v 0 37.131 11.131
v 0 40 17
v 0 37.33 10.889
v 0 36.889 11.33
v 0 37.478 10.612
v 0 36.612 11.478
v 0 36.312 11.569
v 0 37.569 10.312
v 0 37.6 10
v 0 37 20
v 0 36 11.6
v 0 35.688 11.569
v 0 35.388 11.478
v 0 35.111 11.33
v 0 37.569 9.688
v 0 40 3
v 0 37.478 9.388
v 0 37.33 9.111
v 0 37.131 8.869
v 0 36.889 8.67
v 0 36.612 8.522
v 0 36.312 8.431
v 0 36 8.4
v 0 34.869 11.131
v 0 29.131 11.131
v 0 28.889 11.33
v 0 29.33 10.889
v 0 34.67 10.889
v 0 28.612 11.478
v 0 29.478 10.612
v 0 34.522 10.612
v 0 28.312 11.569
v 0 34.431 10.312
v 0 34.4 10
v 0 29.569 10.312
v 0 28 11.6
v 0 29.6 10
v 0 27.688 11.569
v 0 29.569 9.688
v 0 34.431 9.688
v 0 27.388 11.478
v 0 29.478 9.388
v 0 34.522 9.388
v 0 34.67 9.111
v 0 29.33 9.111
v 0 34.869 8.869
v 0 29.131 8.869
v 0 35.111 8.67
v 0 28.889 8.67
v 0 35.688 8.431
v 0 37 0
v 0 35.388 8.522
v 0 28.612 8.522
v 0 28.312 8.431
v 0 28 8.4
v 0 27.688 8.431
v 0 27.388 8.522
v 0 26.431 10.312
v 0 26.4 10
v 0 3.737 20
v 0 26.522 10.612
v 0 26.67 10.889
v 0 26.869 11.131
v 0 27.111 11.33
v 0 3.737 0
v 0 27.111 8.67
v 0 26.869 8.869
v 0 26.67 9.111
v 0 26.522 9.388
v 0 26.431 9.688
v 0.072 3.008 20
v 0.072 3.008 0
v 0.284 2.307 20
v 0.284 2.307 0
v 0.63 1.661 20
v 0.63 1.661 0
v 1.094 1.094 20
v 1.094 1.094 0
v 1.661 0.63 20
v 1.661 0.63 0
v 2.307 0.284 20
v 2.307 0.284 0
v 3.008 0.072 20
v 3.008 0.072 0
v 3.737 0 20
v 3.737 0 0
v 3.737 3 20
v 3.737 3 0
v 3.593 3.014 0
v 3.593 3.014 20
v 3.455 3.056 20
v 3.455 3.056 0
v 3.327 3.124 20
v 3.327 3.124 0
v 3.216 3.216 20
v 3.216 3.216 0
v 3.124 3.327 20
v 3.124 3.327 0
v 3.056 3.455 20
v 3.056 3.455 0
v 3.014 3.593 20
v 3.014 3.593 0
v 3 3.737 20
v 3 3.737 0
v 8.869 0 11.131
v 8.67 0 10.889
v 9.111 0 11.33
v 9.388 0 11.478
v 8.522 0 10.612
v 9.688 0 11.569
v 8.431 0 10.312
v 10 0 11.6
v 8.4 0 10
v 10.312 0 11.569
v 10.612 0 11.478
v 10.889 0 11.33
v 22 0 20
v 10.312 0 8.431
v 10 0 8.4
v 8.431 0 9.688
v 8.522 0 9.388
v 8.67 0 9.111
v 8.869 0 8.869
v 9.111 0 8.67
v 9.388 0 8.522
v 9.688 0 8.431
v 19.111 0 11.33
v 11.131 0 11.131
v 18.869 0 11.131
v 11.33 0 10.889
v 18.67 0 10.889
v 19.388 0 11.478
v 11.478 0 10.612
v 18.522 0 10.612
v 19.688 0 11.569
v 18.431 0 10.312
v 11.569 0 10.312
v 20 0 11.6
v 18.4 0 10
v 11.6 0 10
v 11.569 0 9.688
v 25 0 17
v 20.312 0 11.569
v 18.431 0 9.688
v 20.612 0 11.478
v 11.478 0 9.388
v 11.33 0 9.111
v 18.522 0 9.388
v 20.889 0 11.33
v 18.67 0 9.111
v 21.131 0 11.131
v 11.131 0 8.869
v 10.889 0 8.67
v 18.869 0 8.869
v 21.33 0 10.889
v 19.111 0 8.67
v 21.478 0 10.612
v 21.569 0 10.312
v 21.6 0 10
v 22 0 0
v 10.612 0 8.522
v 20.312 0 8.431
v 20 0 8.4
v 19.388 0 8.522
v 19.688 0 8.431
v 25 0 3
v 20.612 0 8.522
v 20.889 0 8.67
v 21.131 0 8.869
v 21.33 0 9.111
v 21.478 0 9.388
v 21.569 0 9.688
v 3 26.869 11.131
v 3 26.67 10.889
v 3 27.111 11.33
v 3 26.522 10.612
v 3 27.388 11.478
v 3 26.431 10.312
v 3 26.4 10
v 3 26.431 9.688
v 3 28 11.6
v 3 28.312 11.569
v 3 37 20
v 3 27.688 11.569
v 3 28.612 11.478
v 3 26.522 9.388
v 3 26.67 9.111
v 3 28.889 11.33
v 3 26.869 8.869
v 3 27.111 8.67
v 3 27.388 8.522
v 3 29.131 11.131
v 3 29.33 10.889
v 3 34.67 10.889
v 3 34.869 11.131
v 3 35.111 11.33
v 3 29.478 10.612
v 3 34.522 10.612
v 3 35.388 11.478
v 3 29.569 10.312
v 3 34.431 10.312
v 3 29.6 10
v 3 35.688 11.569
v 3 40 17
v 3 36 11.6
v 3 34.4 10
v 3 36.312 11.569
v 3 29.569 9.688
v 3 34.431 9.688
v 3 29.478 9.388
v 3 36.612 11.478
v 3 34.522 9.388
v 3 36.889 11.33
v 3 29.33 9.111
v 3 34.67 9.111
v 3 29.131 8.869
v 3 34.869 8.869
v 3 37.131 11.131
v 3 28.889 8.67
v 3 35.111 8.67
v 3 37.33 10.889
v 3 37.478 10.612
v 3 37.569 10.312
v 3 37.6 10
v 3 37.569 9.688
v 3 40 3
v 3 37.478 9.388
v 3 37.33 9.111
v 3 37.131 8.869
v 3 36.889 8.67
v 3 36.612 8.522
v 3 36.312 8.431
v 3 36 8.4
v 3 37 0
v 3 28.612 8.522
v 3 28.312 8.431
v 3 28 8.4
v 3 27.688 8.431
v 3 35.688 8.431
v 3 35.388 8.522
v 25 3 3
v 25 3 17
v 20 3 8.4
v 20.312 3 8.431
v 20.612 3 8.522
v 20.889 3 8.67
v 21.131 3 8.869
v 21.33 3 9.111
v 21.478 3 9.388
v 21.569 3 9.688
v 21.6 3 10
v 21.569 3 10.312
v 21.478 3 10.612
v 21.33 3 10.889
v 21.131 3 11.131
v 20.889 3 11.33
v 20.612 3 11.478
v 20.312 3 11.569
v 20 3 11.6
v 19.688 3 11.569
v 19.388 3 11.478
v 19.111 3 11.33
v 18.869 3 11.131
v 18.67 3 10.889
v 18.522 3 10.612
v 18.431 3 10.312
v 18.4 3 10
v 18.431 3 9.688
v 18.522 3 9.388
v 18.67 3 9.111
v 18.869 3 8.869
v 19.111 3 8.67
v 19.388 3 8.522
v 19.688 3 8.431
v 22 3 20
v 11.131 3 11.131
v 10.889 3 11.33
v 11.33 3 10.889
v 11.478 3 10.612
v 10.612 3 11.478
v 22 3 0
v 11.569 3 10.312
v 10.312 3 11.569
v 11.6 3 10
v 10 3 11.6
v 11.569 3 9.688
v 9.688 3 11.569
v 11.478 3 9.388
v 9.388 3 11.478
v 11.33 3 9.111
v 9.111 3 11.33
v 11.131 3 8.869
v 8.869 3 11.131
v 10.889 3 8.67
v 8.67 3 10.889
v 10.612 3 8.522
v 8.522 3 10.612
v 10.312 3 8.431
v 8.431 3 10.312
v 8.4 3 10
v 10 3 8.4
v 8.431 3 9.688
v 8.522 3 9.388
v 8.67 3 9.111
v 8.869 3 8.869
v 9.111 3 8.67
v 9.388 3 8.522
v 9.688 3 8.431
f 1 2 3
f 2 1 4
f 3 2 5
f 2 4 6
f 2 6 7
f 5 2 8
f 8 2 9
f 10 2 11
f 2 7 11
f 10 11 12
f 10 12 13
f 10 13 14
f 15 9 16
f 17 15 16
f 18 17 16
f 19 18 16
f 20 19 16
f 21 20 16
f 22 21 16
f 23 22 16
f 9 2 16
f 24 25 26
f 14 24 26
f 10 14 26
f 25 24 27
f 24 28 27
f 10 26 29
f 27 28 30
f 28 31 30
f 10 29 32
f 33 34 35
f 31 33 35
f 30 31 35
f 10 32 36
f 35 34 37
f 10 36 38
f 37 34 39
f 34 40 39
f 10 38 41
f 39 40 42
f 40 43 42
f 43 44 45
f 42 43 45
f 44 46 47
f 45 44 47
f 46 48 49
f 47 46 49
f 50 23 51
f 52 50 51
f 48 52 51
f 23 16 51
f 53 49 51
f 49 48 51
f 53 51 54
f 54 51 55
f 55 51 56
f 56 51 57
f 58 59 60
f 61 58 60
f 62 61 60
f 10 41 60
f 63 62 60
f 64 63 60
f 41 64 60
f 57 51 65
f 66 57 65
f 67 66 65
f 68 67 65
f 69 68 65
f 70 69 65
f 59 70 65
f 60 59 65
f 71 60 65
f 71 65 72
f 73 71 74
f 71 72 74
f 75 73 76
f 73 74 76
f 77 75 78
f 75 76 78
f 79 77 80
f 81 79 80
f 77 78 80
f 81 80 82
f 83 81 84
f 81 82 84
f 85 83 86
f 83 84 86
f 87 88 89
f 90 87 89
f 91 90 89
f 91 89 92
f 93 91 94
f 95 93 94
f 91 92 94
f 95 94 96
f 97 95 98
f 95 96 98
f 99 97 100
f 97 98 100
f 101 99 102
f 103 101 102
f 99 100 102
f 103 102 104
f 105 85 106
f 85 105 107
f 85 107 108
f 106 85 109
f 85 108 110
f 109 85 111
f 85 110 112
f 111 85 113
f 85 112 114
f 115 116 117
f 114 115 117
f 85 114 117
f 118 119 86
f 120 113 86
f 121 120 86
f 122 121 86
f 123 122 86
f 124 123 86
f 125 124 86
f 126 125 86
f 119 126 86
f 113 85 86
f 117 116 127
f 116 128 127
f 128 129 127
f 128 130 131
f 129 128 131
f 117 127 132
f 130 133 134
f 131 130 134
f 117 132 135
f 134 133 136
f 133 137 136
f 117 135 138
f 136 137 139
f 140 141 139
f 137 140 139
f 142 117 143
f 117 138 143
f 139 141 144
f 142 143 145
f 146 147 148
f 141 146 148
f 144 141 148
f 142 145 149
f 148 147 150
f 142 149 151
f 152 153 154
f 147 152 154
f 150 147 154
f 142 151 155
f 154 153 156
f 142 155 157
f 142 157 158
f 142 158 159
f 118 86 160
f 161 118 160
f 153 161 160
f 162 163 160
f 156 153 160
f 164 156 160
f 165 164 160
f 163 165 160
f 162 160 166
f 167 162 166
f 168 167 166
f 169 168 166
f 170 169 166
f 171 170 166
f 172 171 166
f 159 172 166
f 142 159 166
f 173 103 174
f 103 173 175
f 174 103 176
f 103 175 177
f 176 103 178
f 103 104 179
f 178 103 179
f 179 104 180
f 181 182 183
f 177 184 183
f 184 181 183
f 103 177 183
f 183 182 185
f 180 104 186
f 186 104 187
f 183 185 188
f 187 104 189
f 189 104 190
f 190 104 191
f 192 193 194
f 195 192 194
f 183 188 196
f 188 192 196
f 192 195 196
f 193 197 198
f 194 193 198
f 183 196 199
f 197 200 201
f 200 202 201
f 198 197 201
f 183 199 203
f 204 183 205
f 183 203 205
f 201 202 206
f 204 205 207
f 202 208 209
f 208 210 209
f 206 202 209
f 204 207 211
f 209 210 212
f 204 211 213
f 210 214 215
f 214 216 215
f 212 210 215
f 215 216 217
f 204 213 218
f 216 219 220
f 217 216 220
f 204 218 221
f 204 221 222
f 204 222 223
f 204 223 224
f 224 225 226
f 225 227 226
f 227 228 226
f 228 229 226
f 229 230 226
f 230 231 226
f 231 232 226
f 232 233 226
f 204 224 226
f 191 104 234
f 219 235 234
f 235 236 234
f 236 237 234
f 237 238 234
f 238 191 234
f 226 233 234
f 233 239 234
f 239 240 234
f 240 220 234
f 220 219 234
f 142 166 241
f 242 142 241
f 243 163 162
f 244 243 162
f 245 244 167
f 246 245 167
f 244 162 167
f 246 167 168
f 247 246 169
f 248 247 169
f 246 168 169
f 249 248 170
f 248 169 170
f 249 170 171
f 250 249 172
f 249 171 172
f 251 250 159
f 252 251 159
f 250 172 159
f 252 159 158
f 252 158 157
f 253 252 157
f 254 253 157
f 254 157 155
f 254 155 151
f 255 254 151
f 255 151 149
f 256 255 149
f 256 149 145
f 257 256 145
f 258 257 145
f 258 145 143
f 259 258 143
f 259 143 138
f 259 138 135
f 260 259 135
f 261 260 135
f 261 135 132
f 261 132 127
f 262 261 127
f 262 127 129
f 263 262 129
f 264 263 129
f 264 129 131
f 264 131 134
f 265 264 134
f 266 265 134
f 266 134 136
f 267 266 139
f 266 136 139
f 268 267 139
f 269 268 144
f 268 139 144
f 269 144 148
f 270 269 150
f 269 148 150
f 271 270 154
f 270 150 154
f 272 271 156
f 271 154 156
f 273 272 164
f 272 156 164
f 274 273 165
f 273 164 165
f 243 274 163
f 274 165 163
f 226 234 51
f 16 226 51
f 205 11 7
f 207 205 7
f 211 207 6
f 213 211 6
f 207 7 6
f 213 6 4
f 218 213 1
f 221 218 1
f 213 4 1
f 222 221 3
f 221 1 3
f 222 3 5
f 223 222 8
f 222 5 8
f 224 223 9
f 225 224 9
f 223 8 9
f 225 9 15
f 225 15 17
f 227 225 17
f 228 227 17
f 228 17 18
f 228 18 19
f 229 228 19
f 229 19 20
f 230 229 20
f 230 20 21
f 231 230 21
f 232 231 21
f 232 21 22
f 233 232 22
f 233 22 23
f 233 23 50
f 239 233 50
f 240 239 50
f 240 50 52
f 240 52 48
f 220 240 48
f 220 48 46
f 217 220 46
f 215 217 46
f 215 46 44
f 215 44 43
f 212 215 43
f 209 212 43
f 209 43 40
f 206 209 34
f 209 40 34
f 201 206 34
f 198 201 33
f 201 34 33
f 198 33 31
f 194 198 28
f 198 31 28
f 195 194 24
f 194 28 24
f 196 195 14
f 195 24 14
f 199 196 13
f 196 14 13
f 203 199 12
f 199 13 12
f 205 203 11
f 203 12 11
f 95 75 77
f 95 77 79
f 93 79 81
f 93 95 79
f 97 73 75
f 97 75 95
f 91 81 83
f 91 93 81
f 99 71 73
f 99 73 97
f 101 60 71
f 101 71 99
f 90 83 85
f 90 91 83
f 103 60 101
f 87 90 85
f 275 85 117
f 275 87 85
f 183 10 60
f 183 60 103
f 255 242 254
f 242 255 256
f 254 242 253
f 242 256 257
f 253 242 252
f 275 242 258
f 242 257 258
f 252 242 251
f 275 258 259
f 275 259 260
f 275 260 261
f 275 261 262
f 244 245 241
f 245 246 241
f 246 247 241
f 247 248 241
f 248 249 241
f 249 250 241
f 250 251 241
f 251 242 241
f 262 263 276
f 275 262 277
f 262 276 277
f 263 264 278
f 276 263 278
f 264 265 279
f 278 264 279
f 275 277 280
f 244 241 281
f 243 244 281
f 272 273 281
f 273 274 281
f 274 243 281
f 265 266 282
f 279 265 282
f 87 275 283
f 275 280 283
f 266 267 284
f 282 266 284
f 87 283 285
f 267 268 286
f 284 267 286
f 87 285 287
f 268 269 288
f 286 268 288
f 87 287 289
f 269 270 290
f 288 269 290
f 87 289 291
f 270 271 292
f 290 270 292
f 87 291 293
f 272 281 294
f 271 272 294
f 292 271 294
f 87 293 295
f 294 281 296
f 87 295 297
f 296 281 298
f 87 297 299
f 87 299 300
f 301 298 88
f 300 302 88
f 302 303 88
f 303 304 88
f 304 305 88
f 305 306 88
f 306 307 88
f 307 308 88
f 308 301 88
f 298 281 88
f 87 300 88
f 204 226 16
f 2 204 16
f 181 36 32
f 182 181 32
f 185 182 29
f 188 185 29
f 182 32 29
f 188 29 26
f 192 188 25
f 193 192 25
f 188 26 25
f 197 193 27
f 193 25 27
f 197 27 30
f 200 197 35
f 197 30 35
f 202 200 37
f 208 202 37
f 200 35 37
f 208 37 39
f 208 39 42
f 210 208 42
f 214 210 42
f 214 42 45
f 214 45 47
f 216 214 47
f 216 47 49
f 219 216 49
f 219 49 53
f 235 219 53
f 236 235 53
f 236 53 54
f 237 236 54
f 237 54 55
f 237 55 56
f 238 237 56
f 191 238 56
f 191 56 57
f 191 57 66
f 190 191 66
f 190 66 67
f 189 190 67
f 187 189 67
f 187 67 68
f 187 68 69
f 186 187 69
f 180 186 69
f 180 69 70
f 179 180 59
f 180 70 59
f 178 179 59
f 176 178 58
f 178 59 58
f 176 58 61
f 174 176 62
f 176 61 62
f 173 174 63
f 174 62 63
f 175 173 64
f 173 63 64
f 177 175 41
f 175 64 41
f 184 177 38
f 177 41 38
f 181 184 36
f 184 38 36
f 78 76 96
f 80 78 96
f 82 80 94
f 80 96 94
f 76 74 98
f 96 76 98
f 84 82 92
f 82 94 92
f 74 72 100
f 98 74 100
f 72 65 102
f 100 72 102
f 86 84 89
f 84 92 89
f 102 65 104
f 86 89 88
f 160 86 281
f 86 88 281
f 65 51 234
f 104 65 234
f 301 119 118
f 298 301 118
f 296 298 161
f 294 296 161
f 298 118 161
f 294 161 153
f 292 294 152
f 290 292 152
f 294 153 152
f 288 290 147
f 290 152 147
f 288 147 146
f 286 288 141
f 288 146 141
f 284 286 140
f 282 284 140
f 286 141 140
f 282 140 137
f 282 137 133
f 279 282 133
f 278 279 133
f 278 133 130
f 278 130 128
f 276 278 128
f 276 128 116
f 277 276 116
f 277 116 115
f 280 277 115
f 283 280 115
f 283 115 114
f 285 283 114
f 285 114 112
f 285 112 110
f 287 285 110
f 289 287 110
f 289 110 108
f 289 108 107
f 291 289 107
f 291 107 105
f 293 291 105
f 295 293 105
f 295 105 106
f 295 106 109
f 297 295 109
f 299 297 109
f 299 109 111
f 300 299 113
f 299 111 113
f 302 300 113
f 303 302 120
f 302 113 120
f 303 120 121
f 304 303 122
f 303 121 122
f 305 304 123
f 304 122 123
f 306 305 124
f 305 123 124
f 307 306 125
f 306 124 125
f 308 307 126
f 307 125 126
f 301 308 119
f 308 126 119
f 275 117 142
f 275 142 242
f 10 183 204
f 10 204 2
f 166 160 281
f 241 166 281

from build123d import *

# Parameters (mm, degrees)
SM_BASE_FLANGE_1_DEPTH = 20
CHAMFER_1_SIZE         = 3
SKETCH_6_R             = 1.6
CUT_EXTRUDE_1_DEPTH    = 52.23475383
PATTERN_LINEAR_1_COUNT = 2
PATTERN_LINEAR_1_PITCH = 10
SKETCH_7_R             = 1.6
CUT_EXTRUDE_2_DEPTH    = 52.23475383
PATTERN_LINEAR_2_COUNT = 2
PATTERN_LINEAR_2_PITCH = 8


# Sheet-metal steps are written as plain solids
with BuildPart() as part:
    # Sketch 1 → 基材-凸緣1 (new body)
    with BuildSketch(Plane.XY):
        with BuildLine():
            Line((0, 40), (0, 3.7366))
            ThreePointArc((0, 3.7366), (1.094424801, 1.094424801), (3.7366, 0))
            Line((3.7366, 0), (25, 0))
            Line((25, 0), (25, 3))
            Line((25, 3), (3.7366, 3))
            ThreePointArc((3.7366, 3), (3.215745145, 3.215745145), (3, 3.7366))
            Line((3, 3.7366), (3, 40))
            Line((3, 40), (0, 40))
        make_face()
    extrude(amount=SM_BASE_FLANGE_1_DEPTH)

    # 導角1
    chamfer_1_edges = [part.edges().sort_by_distance(p)[0] for p in [
        (25, 1.5, 20),
        (25, 1.5, 0),
        (1.5, 40, 20),
        (1.5, 40, 0),
    ]]
    chamfer(chamfer_1_edges, length=CHAMFER_1_SIZE)

    # 草圖6 → 除料-伸長1 (cut, through all)
    with BuildSketch(Plane.XZ):
        with Locations(Location((20, 10, 0), (0, 0, 270))):
            Circle(SKETCH_6_R)
    cut_extrude_1 = extrude(amount=-CUT_EXTRUDE_1_DEPTH, mode=Mode.SUBTRACT)

    # 直線複製排列1: 除料-伸長1 ×2
    with Locations(*[(-i * PATTERN_LINEAR_1_PITCH, 0, 0) for i in range(1, PATTERN_LINEAR_1_COUNT)]):
        add(cut_extrude_1, mode=Mode.SUBTRACT)

    # 草圖7 → 除料-伸長2 (cut, through all)
    with BuildSketch(Plane.ZY):
        with Locations((10, 36)):
            Circle(SKETCH_7_R)
    cut_extrude_2 = extrude(amount=-CUT_EXTRUDE_2_DEPTH, mode=Mode.SUBTRACT)

    # 直線複製排列2: 除料-伸長2 ×2
    with Locations(*[(0, -i * PATTERN_LINEAR_2_PITCH, 0) for i in range(1, PATTERN_LINEAR_2_COUNT)]):
        add(cut_extrude_2, mode=Mode.SUBTRACT)


solid = part.part
